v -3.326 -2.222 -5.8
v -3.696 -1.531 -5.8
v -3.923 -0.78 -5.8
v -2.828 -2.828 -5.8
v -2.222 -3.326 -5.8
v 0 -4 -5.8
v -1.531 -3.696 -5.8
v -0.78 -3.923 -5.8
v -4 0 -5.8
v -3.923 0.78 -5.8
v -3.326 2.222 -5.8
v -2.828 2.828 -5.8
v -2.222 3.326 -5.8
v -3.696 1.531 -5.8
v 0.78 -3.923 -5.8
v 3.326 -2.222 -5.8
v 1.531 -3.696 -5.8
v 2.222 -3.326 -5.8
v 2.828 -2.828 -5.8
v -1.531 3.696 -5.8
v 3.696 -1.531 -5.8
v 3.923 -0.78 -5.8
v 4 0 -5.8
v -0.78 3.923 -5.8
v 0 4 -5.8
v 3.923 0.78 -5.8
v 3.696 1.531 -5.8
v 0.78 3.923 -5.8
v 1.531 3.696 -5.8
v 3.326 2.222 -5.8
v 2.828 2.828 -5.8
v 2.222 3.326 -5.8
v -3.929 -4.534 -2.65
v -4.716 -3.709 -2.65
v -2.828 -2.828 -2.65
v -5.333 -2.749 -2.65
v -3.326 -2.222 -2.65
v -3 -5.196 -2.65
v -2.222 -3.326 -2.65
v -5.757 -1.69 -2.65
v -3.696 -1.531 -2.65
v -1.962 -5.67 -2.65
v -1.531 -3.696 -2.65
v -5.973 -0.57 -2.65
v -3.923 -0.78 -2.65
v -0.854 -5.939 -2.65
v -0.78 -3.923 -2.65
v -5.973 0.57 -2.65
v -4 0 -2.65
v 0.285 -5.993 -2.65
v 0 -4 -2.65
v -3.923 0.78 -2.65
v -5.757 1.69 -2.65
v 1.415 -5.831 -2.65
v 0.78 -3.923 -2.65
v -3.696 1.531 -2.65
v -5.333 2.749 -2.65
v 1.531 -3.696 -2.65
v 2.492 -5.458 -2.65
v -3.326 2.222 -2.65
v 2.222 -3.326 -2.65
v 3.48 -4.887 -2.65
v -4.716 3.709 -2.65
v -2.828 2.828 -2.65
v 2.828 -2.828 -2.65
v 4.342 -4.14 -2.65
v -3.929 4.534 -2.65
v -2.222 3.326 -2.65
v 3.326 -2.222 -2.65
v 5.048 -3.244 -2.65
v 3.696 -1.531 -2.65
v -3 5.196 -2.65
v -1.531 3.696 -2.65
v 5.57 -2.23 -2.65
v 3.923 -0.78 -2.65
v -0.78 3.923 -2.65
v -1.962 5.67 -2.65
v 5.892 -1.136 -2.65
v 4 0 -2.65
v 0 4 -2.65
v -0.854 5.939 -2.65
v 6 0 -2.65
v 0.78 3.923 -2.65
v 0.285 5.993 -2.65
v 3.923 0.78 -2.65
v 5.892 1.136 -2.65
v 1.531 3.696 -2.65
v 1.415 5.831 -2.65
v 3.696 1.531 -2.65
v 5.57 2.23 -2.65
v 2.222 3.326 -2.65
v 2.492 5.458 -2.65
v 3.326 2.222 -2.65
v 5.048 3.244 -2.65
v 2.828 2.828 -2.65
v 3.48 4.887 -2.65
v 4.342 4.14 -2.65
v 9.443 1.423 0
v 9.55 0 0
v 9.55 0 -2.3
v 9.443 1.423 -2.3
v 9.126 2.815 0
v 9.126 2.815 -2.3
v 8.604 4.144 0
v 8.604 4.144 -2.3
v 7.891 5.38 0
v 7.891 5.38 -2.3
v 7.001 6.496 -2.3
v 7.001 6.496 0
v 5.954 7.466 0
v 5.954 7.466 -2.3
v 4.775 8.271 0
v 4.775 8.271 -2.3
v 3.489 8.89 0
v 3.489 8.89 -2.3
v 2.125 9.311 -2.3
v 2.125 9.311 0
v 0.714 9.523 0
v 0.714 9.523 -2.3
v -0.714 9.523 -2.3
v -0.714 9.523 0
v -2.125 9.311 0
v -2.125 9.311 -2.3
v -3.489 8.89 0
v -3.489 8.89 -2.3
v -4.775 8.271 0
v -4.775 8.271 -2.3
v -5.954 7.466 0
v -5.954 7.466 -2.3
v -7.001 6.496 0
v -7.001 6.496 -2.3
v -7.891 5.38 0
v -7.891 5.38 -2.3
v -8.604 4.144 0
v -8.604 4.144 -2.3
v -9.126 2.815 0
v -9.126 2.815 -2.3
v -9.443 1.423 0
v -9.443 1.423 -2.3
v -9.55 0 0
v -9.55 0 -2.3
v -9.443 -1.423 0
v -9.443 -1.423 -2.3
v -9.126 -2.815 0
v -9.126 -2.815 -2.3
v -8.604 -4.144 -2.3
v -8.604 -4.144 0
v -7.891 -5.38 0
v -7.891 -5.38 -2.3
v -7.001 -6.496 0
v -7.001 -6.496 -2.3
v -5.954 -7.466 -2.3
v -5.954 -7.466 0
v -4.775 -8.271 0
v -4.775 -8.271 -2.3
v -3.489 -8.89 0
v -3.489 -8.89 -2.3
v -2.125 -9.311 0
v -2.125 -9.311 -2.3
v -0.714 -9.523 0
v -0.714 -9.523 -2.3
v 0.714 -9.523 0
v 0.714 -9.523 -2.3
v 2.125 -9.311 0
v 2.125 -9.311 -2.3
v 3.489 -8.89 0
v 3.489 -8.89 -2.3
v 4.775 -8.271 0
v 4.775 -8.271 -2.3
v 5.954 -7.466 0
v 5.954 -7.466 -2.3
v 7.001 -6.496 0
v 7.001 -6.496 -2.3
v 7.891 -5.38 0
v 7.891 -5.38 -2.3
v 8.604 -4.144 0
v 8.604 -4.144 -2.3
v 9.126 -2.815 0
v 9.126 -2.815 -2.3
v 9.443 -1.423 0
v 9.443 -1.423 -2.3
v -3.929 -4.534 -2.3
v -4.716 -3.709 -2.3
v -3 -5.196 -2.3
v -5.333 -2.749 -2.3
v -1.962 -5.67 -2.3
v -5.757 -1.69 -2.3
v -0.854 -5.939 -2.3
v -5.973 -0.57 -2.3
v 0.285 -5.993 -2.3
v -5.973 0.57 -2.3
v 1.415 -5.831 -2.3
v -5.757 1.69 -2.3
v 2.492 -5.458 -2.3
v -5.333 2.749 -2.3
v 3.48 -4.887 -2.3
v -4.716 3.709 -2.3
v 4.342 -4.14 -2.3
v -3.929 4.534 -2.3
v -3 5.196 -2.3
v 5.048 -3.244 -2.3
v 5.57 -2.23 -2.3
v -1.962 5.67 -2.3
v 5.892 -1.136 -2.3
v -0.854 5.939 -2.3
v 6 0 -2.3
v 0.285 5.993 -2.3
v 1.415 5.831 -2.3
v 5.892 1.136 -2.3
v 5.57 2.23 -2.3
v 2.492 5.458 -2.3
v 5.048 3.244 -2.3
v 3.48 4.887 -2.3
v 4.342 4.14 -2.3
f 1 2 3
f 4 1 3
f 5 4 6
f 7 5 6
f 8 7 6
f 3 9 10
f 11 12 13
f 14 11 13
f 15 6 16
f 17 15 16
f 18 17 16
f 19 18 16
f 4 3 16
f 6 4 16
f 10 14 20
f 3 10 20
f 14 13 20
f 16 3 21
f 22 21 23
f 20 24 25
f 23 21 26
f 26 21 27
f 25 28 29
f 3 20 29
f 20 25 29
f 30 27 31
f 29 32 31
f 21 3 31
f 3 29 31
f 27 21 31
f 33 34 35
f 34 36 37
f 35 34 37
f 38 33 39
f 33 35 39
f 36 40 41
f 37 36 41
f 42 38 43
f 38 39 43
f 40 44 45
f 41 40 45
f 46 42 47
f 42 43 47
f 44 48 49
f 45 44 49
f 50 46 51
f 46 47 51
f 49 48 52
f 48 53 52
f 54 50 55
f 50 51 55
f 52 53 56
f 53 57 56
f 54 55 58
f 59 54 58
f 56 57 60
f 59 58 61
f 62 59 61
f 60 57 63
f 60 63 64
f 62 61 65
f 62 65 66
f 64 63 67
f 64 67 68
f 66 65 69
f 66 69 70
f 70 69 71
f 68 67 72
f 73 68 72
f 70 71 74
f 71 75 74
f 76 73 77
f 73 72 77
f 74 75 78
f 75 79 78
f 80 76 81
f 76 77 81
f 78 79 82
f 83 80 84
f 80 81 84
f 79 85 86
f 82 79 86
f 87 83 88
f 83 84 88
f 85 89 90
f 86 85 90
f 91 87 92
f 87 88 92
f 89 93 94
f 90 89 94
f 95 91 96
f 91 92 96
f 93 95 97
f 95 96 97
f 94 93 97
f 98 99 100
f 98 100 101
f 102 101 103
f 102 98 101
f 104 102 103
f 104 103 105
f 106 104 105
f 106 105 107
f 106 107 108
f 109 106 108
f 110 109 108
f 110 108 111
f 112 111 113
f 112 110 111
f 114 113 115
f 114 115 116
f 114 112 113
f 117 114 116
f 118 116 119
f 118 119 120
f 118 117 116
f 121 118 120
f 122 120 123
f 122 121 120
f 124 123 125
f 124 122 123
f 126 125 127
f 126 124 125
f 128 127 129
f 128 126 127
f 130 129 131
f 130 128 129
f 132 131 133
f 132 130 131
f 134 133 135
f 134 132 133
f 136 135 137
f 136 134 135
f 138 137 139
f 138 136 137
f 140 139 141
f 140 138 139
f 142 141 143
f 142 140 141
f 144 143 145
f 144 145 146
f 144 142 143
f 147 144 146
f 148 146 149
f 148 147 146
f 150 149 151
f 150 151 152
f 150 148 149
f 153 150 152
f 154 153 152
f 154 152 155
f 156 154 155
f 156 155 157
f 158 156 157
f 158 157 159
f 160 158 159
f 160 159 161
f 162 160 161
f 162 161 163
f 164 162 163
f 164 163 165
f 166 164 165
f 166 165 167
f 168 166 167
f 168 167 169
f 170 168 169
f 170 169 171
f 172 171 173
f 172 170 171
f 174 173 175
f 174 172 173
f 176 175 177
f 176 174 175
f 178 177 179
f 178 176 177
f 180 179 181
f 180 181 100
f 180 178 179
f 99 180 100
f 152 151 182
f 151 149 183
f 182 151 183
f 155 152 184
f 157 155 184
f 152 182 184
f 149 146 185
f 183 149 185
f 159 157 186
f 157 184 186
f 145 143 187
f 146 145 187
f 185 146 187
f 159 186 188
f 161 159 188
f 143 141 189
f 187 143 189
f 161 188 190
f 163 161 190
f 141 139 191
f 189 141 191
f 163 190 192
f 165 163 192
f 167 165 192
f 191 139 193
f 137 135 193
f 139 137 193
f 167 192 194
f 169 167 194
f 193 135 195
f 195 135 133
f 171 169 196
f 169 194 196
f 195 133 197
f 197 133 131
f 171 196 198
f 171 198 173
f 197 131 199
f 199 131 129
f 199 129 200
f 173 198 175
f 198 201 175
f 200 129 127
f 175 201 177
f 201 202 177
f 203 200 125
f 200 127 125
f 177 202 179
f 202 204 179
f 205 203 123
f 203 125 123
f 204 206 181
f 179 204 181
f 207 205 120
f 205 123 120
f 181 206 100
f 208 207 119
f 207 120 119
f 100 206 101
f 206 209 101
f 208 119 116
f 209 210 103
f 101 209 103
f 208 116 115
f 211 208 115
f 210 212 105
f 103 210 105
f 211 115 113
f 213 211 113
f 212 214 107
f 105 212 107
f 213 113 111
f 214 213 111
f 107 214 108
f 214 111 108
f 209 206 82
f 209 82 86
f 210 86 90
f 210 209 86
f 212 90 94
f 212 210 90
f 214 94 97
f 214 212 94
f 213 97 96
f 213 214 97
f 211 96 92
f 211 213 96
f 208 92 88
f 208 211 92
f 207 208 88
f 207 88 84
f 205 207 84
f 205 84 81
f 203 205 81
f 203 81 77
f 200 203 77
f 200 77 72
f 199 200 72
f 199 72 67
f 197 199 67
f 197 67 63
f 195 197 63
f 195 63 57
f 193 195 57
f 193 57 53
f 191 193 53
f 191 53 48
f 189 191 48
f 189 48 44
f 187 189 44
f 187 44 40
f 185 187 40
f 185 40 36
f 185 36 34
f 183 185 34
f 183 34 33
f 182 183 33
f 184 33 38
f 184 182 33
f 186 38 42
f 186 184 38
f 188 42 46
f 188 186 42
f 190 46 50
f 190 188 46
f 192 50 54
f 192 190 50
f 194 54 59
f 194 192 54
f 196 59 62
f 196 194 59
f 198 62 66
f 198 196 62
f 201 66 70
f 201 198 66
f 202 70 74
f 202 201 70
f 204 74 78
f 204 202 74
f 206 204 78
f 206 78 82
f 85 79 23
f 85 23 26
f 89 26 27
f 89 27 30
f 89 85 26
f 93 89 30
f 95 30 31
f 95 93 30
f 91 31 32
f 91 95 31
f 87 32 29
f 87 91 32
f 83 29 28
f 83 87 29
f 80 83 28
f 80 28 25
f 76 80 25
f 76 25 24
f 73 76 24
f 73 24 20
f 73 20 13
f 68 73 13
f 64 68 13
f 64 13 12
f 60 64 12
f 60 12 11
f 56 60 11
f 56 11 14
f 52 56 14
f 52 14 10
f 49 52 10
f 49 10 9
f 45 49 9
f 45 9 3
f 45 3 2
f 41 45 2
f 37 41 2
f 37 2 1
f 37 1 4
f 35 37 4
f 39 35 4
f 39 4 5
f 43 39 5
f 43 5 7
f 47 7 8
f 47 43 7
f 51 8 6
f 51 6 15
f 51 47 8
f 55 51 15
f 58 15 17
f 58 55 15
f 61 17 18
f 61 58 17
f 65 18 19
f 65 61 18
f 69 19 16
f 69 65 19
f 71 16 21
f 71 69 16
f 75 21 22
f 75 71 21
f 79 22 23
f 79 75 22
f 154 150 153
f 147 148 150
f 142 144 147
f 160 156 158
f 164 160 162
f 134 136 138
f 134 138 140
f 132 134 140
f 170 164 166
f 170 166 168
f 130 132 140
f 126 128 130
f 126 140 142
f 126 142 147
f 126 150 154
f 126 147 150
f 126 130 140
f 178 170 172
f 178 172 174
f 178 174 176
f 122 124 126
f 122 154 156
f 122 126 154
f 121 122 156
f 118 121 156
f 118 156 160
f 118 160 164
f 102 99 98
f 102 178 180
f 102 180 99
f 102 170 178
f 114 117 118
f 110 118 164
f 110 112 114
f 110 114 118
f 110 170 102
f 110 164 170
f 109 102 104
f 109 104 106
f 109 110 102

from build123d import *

# Parameters (mm, degrees)
F0_R     = 9.55
F0_R_2   = 6
F1_DEPTH = 2.3
F0_R_3   = 4
F2_DEPTH = 2.65
F3_DEPTH = 5.8


with BuildPart() as f1:
    # F0 (on Top) → F1 (new body)
    with BuildSketch(Plane.XY):
        Circle(F0_R)
        Circle(F0_R_2, mode=Mode.SUBTRACT)
    extrude(amount=-F1_DEPTH)

    # F0 (on Top) → F2 (join)
    with BuildSketch(Plane.XY):
        Circle(F0_R_2)
        Circle(F0_R_3, mode=Mode.SUBTRACT)
    extrude(amount=-F2_DEPTH)

    # F0 (on Top) → F3 (join)
    with BuildSketch(Plane.XY):
        Circle(F0_R_3)
    extrude(amount=-F3_DEPTH)


solid = f1.part
